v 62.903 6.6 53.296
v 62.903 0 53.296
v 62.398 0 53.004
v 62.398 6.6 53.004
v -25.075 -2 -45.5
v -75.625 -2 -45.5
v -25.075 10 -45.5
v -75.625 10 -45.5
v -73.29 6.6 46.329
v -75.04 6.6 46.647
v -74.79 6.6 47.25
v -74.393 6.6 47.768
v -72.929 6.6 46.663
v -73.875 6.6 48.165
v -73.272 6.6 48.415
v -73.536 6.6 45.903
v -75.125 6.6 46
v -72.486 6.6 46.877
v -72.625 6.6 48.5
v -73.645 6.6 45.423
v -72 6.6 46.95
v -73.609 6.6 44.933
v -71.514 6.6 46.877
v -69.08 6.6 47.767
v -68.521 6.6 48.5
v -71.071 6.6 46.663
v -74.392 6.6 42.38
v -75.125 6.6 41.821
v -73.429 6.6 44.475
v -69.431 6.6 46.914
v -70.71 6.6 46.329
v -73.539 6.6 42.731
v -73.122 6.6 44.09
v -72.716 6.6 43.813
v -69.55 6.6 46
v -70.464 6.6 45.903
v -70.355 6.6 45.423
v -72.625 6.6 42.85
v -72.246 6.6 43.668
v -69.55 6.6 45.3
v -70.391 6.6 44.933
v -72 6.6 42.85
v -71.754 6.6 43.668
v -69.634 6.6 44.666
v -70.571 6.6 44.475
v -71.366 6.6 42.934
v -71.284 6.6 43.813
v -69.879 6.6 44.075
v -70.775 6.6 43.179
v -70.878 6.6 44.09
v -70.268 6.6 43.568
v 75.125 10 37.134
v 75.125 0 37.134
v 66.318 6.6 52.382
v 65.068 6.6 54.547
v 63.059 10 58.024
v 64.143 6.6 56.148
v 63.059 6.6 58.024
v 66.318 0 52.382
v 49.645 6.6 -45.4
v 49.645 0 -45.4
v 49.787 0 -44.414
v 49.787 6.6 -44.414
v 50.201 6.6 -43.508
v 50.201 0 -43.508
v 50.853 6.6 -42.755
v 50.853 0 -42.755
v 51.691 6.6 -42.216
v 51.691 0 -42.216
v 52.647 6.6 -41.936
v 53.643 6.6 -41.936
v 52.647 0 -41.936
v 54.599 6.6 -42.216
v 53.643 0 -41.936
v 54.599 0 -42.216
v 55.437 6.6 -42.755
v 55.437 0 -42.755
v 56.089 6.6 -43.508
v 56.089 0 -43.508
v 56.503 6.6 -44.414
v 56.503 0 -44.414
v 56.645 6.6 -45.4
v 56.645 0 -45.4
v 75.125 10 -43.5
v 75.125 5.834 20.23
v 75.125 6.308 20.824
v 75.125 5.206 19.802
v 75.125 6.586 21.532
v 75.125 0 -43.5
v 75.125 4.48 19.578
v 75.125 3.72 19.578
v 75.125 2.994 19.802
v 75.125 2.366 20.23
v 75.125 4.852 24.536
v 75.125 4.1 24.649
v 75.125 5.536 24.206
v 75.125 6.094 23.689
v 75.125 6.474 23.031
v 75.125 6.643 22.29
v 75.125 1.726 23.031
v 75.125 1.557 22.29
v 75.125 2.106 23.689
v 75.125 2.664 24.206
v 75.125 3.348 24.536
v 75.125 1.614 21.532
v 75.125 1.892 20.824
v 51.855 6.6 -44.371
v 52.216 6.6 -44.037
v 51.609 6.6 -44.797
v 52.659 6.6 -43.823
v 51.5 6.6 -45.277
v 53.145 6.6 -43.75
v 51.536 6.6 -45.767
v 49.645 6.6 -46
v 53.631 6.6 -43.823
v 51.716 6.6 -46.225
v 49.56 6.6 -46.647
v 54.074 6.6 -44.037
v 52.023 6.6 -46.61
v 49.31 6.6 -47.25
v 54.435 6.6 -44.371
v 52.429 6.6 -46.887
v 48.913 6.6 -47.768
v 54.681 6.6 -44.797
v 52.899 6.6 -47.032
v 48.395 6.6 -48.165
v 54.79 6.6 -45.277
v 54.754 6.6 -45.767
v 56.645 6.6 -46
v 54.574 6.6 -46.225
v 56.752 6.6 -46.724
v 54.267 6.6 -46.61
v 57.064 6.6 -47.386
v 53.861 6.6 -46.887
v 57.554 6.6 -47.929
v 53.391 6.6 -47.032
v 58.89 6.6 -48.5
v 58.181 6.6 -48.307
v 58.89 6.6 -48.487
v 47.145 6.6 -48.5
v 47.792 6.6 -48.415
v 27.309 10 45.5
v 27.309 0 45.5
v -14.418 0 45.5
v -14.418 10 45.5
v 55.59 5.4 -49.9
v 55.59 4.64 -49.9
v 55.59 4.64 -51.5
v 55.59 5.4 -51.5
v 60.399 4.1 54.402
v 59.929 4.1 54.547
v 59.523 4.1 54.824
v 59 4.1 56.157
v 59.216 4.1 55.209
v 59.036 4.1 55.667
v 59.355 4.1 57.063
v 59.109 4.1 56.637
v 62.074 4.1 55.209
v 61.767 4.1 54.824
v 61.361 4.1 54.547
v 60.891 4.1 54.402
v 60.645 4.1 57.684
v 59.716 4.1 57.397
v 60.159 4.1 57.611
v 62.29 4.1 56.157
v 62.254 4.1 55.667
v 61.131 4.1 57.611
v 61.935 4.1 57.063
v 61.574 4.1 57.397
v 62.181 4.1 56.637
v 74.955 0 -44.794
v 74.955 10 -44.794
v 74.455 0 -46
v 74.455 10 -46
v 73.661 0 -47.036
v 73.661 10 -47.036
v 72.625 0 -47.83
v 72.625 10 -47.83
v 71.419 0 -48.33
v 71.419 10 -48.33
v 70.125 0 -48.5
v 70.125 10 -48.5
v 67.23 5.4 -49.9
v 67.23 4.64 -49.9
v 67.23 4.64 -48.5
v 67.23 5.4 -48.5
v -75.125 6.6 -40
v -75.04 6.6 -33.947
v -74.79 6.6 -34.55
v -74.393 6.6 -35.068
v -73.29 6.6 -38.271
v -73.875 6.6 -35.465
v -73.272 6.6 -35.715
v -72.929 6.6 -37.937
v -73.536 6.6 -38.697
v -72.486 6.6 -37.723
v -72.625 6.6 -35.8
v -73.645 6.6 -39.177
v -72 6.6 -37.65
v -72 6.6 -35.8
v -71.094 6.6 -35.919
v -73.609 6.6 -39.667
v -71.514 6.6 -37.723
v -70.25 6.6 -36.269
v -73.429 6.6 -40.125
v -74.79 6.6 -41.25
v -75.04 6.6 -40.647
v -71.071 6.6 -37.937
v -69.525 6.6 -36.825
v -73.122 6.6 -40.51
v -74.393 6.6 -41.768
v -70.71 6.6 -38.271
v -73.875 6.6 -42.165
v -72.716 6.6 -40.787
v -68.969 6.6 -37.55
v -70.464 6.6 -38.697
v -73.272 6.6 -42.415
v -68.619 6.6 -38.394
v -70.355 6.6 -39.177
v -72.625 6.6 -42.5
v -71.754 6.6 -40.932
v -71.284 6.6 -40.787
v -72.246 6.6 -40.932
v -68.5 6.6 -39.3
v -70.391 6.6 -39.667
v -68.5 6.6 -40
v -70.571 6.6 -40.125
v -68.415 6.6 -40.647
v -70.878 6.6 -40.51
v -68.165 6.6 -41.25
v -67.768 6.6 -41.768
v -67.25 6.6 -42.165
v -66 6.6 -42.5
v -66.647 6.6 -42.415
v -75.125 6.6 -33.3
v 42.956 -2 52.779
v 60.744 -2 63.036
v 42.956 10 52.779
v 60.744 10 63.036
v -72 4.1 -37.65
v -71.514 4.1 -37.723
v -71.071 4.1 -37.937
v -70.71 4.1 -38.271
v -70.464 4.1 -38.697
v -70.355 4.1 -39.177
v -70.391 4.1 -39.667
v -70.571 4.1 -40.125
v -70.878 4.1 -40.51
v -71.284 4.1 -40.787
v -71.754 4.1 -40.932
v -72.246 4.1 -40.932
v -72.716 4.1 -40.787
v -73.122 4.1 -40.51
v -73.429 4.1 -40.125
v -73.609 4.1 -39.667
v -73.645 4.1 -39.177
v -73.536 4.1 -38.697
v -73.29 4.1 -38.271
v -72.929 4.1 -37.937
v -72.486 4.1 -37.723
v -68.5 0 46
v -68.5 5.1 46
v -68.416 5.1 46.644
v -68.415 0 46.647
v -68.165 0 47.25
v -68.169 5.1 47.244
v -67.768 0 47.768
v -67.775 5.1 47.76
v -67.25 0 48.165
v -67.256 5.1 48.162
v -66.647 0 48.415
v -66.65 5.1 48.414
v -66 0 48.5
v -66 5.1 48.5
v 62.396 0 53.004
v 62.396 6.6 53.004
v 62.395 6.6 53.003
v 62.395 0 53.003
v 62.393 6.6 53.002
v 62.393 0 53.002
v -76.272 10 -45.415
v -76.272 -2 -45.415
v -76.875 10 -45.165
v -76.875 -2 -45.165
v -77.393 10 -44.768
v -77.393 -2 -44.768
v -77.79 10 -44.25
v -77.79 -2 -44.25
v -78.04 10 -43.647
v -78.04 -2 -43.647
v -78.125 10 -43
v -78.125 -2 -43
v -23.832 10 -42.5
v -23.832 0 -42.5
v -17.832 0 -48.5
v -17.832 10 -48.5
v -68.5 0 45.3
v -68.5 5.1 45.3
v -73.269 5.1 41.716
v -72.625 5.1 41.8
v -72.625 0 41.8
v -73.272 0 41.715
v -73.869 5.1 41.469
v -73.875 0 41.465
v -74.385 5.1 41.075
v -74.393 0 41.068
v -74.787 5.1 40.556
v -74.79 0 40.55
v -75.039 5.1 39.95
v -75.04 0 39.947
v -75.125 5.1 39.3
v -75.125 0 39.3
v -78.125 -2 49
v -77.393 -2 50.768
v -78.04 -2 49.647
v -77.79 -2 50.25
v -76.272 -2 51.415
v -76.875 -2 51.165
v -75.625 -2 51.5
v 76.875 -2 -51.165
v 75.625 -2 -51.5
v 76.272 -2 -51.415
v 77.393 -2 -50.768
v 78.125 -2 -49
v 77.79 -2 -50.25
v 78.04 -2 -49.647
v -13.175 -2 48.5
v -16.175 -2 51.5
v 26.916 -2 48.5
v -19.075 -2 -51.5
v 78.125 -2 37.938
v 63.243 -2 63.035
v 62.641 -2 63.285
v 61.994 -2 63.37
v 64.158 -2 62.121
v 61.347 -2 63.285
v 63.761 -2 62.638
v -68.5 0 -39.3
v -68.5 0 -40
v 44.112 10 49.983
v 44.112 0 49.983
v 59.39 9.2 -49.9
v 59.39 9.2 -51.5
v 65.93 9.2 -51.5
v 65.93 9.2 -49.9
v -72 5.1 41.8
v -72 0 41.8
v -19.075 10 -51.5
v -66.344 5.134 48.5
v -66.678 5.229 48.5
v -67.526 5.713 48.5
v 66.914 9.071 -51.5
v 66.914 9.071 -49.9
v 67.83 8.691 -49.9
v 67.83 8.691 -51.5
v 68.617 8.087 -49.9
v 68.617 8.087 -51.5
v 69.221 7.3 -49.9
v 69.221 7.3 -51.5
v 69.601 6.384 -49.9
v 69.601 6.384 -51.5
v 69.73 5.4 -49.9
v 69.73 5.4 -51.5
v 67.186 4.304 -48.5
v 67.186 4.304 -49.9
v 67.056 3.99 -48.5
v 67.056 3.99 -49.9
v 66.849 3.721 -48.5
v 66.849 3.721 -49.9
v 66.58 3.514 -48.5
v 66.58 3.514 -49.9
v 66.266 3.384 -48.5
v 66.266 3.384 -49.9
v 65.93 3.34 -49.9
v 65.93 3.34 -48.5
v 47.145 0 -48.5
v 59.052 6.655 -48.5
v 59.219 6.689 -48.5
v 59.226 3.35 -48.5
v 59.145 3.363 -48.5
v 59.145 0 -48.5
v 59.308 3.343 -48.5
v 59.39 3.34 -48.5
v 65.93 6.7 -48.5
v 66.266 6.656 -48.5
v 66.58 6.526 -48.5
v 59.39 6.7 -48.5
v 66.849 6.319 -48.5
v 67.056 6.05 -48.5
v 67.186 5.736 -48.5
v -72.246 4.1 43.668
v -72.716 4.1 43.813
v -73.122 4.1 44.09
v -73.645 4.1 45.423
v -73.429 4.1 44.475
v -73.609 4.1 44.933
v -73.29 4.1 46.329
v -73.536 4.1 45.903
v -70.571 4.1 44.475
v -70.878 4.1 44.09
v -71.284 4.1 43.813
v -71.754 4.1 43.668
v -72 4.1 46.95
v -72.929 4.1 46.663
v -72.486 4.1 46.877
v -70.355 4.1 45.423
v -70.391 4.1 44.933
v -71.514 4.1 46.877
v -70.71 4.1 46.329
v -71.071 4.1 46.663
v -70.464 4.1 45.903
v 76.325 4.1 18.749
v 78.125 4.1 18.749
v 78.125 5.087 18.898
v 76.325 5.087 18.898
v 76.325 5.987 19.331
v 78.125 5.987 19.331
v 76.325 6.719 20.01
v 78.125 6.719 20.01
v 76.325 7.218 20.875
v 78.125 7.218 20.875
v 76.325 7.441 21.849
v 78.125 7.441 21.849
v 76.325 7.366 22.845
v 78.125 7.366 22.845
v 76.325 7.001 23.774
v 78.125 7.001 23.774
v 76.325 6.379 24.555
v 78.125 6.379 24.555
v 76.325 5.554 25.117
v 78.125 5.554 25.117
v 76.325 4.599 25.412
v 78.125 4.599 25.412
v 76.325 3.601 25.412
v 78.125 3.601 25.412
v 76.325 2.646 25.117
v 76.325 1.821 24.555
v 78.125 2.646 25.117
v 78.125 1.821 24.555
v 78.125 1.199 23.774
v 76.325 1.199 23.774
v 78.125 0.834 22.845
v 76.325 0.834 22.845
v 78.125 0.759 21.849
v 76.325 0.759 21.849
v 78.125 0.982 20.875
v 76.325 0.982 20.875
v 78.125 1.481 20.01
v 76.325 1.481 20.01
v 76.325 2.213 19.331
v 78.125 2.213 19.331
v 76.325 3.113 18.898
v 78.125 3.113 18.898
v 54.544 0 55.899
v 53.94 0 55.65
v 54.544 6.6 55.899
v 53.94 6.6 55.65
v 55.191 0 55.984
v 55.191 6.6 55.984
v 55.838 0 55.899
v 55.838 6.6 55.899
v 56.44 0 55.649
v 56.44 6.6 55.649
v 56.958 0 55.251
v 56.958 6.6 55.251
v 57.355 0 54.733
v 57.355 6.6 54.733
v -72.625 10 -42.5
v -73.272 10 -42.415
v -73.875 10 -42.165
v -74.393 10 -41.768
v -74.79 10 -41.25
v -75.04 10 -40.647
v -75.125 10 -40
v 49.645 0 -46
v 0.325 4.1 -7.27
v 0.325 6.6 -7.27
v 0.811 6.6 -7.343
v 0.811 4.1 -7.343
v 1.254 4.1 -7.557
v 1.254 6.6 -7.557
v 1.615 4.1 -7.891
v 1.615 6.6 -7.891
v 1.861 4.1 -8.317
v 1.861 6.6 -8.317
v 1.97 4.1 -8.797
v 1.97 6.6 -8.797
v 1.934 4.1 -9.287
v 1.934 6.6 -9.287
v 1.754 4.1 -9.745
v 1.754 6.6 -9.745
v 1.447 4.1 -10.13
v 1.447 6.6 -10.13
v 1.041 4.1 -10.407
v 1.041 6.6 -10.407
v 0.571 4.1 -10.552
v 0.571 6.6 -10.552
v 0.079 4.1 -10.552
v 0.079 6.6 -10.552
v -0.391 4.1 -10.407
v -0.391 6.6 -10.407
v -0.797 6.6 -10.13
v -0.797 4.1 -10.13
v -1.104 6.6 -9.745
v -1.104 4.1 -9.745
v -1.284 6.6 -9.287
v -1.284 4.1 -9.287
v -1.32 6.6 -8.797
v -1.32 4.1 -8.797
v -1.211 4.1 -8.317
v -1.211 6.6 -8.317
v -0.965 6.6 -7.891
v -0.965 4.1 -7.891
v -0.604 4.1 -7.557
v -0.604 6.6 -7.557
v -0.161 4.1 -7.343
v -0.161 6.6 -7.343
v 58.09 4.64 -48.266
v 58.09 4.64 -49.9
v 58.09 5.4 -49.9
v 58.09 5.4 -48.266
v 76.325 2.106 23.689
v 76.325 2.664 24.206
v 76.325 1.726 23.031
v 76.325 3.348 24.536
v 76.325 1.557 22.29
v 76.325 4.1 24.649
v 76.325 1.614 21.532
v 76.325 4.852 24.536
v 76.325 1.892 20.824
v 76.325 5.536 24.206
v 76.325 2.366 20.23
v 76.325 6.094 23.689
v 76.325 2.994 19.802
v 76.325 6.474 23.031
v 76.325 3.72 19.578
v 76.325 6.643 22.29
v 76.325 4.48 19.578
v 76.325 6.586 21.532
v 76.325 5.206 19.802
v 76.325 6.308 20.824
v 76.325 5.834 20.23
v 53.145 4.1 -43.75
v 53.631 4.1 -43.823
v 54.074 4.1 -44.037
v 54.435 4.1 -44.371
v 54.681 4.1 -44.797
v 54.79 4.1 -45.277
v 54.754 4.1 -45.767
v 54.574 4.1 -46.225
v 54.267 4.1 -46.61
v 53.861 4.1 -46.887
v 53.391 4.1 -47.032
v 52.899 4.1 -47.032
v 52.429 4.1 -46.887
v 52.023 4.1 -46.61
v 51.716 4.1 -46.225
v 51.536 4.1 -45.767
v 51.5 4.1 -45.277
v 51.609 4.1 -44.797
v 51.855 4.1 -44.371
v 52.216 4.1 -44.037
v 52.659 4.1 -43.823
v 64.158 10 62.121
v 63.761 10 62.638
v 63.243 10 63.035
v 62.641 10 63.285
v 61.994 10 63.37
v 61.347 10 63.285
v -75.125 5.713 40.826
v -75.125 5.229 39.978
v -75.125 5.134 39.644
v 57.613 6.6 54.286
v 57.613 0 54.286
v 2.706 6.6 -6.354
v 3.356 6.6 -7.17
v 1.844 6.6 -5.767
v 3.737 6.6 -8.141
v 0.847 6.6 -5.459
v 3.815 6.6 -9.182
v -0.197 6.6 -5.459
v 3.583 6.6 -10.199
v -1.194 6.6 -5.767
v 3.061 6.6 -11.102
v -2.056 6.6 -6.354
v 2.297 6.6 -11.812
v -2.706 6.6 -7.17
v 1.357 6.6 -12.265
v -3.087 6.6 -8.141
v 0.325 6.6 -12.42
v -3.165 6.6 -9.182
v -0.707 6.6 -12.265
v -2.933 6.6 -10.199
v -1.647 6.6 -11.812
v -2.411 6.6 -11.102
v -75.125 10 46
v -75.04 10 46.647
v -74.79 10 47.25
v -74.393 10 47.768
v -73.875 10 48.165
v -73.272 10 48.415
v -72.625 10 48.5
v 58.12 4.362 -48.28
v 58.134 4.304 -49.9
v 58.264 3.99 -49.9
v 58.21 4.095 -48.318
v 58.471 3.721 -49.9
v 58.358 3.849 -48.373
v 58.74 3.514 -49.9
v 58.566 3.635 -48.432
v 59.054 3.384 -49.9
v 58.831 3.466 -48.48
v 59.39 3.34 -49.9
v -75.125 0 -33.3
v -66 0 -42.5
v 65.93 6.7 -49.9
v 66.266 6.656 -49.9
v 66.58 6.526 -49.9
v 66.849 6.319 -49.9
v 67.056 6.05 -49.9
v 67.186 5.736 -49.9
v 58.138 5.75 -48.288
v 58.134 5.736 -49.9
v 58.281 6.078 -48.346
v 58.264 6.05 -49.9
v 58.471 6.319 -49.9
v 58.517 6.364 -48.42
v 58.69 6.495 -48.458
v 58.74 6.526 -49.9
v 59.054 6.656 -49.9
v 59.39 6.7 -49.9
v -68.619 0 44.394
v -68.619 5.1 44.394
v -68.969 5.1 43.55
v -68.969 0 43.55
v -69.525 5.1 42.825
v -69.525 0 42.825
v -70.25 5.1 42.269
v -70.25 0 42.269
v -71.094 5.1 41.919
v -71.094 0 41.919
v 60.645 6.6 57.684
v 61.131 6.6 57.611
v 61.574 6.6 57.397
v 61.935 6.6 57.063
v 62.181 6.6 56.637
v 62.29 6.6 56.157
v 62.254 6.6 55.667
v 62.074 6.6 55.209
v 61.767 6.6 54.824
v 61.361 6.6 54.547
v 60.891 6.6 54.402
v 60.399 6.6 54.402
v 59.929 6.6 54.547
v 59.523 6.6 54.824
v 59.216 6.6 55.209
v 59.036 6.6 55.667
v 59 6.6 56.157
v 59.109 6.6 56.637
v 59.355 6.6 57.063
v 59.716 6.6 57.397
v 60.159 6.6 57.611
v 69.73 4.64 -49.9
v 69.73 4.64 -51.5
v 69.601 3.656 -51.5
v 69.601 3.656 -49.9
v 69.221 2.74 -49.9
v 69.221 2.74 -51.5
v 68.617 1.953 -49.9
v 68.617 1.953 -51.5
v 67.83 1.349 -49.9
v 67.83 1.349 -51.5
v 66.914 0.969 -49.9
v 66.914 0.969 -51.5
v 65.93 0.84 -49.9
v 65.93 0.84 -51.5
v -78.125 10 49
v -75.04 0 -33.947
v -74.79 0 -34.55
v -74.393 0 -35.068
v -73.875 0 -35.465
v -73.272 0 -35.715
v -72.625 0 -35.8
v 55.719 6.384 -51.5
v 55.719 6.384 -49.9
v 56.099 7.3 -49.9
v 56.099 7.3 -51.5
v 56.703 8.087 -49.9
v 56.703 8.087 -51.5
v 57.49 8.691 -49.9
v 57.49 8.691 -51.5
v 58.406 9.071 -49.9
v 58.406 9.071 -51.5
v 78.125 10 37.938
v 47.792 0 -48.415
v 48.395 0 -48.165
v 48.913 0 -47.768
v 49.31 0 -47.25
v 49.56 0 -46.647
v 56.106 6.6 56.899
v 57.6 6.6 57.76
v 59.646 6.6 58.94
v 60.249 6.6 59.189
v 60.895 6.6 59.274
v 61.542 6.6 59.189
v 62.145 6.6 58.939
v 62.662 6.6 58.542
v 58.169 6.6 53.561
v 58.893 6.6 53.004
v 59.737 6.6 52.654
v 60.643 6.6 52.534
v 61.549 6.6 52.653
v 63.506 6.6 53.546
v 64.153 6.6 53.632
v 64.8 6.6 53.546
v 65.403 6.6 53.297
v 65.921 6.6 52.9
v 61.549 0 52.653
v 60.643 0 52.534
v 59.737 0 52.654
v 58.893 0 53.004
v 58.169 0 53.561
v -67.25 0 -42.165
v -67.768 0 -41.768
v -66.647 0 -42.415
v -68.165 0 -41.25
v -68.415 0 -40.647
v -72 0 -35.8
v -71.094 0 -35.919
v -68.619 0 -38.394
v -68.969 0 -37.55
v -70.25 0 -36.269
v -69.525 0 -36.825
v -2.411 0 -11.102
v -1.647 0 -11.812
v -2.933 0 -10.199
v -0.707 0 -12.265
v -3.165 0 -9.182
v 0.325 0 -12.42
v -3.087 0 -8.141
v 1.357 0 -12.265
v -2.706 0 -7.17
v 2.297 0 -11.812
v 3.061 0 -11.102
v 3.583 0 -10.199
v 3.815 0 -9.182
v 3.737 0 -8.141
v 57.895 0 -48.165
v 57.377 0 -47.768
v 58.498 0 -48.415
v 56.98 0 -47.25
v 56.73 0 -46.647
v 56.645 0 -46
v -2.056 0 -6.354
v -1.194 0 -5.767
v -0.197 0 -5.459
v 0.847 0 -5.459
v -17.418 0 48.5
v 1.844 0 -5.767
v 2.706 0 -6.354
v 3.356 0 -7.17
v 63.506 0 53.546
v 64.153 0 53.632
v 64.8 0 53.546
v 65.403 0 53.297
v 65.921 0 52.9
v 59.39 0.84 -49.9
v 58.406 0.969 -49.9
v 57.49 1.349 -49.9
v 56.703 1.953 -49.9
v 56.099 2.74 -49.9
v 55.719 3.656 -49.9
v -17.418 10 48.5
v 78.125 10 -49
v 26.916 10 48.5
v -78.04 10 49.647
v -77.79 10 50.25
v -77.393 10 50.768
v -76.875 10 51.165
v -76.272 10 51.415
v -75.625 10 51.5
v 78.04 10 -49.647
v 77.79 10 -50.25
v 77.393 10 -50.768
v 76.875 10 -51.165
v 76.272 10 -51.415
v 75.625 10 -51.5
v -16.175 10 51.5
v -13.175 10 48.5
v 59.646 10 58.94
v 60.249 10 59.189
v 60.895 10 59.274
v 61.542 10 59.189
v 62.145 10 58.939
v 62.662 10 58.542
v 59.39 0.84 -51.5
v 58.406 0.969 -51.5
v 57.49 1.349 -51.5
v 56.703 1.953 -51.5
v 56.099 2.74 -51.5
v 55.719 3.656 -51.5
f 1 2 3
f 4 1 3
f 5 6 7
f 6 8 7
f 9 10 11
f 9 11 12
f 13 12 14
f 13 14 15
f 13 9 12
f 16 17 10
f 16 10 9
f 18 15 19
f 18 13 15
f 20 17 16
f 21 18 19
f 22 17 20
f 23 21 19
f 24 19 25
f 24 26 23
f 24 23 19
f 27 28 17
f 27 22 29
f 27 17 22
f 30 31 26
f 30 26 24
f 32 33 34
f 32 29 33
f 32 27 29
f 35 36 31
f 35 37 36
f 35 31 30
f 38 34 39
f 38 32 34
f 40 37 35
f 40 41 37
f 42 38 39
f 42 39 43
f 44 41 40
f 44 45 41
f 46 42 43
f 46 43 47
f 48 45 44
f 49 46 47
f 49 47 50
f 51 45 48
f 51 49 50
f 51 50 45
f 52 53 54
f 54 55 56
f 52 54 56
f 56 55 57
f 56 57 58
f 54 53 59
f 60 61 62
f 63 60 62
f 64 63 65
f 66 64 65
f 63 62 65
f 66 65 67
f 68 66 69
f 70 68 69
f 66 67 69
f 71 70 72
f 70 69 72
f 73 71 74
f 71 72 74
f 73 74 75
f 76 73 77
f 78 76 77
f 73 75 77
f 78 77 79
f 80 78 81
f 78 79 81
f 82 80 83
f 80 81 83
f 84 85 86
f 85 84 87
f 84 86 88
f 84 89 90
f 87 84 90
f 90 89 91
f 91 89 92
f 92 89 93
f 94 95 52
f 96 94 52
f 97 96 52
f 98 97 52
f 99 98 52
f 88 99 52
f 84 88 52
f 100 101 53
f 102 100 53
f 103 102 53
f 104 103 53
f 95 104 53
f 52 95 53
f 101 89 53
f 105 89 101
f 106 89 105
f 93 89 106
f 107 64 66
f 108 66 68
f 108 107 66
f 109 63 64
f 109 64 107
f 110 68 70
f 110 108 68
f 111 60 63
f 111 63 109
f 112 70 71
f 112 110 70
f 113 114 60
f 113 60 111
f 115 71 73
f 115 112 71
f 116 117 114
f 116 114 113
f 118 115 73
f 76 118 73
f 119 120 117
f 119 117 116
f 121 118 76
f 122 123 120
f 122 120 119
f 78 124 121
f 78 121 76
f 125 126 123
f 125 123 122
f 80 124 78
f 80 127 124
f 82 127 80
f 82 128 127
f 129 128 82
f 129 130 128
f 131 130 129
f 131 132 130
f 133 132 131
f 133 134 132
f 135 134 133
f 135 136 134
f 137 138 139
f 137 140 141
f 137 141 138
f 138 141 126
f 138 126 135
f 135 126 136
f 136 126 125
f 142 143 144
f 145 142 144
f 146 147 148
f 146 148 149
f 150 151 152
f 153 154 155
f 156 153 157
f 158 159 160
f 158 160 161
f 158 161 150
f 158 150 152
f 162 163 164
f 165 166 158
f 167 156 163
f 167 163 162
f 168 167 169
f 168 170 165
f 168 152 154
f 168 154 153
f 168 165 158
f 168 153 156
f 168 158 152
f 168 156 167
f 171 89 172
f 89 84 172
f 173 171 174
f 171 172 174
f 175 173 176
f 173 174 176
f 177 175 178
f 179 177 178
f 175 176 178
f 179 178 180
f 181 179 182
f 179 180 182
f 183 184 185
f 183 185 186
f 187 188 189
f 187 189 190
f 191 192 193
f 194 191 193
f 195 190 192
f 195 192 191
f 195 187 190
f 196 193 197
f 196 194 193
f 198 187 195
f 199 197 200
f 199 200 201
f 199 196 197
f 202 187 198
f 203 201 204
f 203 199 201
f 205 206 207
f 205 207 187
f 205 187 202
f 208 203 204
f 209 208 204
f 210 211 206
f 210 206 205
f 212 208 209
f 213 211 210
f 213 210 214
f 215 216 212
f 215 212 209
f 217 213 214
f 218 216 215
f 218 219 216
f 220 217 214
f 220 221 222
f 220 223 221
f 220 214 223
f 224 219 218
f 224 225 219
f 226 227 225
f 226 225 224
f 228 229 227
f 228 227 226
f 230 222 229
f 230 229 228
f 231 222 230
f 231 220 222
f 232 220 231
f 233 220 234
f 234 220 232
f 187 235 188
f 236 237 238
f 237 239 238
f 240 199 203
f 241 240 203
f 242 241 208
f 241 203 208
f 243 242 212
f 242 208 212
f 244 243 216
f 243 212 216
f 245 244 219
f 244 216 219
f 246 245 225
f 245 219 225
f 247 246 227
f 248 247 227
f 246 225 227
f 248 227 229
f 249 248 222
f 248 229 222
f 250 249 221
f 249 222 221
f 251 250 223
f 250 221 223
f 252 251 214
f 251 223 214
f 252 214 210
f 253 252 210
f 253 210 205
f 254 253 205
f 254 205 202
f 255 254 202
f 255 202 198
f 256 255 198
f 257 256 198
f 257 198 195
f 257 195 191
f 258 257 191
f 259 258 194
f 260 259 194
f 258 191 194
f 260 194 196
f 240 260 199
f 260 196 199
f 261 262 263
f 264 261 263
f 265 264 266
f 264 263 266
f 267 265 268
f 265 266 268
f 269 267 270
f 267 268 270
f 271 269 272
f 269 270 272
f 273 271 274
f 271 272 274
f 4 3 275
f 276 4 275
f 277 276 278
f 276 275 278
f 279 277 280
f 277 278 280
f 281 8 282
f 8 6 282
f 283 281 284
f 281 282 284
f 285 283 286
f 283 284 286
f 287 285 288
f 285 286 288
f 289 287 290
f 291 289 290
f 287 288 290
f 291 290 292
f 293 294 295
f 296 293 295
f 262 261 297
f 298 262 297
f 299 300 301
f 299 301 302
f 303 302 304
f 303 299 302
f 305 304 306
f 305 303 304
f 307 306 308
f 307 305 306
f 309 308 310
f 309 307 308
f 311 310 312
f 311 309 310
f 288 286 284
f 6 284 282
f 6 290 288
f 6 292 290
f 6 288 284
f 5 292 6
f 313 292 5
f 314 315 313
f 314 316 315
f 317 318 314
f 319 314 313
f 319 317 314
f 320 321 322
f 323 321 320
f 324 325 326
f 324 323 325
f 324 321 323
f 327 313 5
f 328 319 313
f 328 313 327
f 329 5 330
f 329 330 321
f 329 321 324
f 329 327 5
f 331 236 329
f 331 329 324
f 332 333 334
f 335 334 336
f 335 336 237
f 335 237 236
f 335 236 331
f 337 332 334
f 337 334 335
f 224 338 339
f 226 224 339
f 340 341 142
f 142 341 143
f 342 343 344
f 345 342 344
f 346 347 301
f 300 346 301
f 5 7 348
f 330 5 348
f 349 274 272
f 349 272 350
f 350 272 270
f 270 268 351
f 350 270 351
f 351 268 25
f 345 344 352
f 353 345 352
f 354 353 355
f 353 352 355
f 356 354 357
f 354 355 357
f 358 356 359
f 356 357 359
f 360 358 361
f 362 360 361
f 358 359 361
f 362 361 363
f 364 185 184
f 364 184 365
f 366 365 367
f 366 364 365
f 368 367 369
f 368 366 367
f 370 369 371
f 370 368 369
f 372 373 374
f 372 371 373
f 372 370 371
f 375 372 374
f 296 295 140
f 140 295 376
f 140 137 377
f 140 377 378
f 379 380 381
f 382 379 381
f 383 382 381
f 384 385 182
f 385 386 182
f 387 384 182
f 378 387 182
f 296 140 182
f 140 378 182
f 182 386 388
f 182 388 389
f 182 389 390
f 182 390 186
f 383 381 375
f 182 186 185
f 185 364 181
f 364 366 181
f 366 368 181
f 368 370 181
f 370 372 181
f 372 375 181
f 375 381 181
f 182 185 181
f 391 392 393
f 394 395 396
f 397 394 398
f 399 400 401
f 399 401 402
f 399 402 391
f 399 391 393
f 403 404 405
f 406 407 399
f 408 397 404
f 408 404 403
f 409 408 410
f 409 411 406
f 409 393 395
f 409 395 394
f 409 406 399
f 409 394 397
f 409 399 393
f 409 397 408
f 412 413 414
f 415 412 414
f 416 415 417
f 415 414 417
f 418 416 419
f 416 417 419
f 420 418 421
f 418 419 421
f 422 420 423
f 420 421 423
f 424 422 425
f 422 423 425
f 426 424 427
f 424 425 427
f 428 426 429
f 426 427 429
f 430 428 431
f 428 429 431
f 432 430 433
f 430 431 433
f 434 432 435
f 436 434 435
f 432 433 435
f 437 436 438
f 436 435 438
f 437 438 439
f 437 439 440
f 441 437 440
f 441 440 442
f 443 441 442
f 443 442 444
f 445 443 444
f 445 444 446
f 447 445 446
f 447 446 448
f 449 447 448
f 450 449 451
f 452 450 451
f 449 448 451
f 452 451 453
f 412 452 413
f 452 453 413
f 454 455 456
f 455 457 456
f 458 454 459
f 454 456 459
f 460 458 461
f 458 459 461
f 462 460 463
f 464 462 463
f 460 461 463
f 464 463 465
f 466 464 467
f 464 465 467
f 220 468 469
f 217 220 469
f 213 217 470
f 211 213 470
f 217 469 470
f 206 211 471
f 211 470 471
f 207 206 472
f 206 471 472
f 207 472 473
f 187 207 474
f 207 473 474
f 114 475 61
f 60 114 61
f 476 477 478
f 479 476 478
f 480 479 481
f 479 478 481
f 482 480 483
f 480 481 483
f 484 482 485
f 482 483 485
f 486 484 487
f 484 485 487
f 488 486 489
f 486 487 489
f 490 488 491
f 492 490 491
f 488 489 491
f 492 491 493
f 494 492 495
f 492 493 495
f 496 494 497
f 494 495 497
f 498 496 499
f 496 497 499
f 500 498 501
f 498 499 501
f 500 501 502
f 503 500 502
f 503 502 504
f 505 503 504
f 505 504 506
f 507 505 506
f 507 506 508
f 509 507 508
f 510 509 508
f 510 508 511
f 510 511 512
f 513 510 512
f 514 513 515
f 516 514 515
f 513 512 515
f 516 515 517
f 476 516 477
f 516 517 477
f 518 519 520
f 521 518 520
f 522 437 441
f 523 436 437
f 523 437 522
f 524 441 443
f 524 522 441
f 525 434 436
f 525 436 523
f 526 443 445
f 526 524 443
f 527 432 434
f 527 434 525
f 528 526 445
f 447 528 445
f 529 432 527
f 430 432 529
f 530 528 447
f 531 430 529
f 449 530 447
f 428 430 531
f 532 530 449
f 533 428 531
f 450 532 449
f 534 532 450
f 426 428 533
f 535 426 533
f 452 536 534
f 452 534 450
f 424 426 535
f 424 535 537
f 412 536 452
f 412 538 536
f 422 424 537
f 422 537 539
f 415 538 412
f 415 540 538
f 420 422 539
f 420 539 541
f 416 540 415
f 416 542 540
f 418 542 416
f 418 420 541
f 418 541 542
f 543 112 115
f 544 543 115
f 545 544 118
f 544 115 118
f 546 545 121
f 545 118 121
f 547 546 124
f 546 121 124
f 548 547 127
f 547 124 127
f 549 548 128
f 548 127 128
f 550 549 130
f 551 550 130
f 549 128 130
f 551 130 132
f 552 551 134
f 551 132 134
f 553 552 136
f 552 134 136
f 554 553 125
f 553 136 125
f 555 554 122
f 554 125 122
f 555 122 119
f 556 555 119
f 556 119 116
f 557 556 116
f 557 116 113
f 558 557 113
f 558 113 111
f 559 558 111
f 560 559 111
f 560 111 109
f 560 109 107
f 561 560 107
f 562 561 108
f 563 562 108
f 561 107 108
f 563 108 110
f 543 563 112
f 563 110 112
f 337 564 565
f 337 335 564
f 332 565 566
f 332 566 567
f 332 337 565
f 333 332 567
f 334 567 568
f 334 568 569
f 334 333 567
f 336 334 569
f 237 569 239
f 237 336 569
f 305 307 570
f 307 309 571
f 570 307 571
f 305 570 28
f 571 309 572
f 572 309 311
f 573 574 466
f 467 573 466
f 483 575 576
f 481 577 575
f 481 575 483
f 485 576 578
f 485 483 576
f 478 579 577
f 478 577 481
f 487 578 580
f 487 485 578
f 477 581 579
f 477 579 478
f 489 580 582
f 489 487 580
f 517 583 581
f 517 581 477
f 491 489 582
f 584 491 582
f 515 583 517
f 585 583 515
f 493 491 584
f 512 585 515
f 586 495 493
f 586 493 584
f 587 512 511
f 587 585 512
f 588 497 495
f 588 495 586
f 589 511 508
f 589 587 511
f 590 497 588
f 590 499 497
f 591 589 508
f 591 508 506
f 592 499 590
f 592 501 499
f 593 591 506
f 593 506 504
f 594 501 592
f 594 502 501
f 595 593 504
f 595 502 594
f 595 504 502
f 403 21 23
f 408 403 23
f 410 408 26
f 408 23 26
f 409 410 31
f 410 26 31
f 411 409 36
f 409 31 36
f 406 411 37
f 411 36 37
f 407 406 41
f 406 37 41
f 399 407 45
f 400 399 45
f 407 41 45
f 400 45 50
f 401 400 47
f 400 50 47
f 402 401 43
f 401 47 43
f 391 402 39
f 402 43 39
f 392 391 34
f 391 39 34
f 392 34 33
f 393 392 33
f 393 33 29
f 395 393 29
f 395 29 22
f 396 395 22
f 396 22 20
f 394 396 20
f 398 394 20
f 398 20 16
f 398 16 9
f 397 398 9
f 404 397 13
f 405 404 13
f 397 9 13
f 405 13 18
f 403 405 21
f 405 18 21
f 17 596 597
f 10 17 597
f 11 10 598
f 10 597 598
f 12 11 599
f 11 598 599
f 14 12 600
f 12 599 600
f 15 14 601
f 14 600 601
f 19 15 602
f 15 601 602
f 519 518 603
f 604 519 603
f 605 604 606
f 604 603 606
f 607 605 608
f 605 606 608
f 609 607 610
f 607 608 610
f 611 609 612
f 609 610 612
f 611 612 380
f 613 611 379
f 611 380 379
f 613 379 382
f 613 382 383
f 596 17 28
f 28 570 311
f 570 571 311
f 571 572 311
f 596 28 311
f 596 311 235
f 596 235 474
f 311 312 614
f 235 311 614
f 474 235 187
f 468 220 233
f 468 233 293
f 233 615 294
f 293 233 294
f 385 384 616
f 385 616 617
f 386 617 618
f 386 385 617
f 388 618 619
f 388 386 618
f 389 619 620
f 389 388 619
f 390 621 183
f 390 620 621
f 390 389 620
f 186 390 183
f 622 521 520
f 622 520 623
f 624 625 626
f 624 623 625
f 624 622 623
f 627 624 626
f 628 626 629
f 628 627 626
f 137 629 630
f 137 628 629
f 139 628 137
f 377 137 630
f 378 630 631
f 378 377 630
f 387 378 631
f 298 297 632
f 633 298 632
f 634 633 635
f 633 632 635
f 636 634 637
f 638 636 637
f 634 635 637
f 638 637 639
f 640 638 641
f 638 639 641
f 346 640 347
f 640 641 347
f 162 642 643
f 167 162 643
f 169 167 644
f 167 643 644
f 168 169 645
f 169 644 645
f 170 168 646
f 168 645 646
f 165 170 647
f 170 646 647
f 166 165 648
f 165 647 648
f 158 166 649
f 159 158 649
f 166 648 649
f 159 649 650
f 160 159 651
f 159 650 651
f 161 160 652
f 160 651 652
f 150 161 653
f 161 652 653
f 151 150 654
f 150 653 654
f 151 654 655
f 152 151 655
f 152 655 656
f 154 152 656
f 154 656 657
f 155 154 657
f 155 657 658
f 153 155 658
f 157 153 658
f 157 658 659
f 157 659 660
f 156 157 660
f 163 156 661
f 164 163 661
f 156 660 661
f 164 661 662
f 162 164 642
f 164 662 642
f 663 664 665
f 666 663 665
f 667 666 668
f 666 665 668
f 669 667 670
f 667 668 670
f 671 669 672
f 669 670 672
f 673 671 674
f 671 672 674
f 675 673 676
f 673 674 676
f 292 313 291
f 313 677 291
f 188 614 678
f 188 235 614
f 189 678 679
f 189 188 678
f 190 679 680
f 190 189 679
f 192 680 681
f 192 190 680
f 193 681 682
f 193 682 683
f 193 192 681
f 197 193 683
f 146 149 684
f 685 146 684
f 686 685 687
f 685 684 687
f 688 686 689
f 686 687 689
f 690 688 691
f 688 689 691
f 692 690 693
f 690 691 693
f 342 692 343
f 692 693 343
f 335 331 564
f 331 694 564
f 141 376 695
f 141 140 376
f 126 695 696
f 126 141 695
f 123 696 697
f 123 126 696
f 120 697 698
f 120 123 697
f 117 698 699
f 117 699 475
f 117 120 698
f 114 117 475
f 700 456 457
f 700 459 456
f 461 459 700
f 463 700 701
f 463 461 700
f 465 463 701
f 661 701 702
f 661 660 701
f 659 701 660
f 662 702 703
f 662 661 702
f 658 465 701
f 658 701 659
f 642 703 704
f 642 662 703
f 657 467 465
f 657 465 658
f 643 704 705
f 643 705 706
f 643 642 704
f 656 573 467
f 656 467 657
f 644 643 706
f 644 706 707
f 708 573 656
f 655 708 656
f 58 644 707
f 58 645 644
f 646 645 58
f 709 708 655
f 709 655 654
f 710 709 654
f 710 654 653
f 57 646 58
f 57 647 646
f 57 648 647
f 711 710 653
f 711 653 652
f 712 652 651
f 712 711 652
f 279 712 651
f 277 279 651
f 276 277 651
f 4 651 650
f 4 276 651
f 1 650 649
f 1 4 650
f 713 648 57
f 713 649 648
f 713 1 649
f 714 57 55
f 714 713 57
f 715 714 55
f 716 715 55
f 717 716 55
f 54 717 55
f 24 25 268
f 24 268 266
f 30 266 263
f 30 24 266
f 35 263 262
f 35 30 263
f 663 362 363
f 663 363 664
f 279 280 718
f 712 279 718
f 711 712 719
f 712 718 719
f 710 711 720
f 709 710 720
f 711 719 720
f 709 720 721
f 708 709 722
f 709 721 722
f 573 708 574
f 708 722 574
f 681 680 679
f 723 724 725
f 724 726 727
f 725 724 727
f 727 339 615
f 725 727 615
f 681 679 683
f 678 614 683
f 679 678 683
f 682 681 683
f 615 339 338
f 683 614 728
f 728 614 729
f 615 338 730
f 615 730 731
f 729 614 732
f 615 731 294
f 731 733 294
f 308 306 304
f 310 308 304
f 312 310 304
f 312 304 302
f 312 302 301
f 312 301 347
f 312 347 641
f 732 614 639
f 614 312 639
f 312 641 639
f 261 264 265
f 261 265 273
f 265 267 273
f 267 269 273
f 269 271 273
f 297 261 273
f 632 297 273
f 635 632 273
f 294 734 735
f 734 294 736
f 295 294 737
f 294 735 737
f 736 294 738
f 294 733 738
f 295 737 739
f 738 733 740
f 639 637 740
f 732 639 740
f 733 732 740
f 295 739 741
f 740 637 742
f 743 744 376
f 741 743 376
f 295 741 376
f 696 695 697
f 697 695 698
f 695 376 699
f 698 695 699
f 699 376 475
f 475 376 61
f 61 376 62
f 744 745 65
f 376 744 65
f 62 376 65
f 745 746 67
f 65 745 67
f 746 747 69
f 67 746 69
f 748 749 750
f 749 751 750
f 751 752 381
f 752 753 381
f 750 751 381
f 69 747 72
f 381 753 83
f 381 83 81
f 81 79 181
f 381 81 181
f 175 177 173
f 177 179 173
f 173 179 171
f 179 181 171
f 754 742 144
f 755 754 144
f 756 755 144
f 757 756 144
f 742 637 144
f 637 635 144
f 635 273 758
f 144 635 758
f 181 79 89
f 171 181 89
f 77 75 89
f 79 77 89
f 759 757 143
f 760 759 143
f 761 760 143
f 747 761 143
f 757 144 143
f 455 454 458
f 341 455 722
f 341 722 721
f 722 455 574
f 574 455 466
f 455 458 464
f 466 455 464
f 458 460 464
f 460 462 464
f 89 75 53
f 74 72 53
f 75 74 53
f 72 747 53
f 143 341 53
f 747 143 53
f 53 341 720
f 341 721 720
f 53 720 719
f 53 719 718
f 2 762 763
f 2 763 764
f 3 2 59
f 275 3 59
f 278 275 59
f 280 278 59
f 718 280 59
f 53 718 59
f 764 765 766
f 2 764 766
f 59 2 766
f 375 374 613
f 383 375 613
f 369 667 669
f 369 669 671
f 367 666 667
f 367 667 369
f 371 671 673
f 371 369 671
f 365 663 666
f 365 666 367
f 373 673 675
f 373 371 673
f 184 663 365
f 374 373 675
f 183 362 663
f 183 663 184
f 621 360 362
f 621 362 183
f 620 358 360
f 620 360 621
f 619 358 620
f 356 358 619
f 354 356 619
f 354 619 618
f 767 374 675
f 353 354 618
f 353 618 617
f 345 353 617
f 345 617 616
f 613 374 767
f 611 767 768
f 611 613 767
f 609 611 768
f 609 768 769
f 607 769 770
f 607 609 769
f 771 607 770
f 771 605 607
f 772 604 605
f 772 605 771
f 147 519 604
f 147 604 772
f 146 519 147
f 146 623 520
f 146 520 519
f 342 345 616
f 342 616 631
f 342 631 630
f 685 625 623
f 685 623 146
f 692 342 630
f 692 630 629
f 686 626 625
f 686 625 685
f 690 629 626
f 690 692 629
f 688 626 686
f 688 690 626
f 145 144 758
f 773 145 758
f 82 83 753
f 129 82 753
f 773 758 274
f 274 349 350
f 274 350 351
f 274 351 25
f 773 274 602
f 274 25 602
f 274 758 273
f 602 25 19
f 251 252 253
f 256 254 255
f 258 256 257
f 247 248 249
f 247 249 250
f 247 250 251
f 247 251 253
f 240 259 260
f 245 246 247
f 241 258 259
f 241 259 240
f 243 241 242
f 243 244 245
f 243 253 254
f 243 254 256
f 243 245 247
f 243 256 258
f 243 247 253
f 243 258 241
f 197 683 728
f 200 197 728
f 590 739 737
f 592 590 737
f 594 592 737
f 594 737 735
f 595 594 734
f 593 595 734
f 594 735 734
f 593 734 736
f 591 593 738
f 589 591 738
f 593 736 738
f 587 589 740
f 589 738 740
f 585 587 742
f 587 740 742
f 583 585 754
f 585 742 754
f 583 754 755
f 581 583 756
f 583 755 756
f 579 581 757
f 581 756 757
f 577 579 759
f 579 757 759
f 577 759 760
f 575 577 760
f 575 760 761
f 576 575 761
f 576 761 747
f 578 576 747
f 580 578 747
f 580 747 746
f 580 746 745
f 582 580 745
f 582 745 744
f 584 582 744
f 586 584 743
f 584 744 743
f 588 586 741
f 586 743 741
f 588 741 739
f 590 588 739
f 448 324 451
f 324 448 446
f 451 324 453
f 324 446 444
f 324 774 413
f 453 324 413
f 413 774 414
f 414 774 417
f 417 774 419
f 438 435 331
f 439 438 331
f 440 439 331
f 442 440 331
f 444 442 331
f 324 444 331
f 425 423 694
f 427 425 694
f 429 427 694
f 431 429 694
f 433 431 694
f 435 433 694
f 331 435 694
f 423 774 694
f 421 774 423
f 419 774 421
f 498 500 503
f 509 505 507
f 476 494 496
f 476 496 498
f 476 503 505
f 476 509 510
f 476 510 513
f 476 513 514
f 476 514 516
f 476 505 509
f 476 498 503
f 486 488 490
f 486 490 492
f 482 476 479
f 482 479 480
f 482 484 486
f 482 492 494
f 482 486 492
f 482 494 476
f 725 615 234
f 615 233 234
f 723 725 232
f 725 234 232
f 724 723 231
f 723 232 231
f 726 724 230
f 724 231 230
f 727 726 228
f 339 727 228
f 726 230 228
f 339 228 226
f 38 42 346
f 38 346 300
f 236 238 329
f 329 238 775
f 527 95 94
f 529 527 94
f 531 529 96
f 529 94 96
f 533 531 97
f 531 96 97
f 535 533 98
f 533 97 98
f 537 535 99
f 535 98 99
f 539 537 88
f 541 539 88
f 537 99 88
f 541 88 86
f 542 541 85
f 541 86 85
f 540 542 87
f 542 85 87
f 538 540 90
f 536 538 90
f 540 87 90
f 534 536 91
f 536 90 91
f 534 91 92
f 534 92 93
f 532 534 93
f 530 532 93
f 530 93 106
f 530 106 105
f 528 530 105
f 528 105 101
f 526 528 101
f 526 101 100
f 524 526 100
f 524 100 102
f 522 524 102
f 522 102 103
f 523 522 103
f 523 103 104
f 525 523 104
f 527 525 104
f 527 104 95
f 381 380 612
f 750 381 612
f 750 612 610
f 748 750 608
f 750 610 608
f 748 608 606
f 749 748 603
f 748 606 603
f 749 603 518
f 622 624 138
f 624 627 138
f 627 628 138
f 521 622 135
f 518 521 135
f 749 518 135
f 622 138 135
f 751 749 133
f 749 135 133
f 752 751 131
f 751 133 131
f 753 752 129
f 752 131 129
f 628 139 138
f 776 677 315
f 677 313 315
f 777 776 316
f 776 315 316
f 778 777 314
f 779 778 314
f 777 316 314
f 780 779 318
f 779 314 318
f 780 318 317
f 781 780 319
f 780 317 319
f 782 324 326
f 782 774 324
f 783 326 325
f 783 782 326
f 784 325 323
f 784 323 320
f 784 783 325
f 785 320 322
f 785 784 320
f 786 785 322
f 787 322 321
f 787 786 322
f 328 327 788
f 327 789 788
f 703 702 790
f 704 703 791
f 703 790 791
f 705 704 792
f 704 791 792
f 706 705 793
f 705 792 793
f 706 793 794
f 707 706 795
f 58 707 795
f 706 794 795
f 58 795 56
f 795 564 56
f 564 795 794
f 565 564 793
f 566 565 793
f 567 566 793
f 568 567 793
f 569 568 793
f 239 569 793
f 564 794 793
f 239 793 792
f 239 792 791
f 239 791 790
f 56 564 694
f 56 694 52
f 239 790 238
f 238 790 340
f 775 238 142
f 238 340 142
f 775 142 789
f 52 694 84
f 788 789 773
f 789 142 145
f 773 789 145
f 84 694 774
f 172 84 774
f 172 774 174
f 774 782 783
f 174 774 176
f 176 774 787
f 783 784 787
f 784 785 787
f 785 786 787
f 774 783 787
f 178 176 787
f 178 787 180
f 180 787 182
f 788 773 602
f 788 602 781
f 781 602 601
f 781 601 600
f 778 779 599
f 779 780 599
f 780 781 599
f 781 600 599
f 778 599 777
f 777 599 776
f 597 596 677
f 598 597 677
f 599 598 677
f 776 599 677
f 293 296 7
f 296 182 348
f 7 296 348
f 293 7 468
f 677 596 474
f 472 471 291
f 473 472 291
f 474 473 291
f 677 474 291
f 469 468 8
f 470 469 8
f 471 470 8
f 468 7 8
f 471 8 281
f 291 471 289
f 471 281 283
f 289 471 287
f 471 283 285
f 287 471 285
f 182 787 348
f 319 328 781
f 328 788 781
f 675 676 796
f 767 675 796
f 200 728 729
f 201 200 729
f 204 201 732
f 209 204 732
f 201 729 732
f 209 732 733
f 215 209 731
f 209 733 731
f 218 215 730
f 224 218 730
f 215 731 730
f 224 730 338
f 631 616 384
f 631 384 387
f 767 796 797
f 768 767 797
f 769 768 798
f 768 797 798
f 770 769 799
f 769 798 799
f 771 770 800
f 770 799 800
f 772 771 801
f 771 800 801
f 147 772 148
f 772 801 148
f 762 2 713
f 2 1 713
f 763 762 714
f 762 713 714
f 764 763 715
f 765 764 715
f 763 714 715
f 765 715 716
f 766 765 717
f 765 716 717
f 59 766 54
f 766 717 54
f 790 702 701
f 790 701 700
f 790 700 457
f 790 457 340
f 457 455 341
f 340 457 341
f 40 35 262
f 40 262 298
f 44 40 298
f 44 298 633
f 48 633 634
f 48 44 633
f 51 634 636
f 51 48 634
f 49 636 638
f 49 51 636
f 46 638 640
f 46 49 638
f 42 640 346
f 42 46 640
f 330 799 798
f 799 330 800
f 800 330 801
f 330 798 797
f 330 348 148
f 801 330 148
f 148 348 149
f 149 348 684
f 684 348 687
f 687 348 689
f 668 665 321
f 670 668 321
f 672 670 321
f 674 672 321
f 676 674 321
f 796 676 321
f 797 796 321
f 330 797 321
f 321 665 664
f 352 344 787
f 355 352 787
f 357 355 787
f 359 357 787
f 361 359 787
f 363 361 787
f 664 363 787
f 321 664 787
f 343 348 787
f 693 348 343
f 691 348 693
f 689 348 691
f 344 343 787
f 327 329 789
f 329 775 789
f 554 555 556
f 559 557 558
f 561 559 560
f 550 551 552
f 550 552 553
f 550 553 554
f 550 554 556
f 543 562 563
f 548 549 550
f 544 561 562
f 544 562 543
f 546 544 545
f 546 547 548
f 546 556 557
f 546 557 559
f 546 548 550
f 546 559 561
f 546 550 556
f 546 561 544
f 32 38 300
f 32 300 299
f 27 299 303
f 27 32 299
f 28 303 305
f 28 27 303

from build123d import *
from OCP.BRepFilletAPI import BRepFilletAPI_MakeChamfer

# Parameters (mm, degrees)
BOSS_EXTRUDE1_DEPTH = 10
BOSS_EXTRUDE2_DEPTH = 2
FILLET1_R           = 2.5
FILLET2_R           = 2.5
FILLET4_R           = 5
SKETCH3_R           = 3.5
BOSS_EXTRUDE3_DEPTH = 6.6
SKETCH5_R           = 1.65
CUT_EXTRUDE1_DEPTH  = 2.5
FILLET3_R           = 2.5
SKETCH6_R           = 2.55
CUT_EXTRUDE2_DEPTH  = 167.136549573
SKETCH7_R           = 3.35
CUT_EXTRUDE3_DEPTH  = 1.8
CUT_EXTRUDE4_REACH  = 141.279
SKETCH8_W           = 9.14
SKETCH8_H           = 3.36
FILLET5_R           = 1.3
CUT_EXTRUDE5_DEPTH  = 1.6
CHAMFER1_SIZE       = 1.5
CHAMFER1_SIZE2      = 1.050311307


with BuildPart() as part:
    # Sketch1 → Boss-Extrude1 (new body)
    with BuildSketch(Plane(origin=(0, 0, 0), x_dir=(1, 0, 0), z_dir=(0, 1, 0))):
        Polygon((78.125, -37.9381301), (62.908489388, -64.283910205), (42.956179643, -52.779359478), (26.916138362, -48.5), (-13.175252532, -48.5), (-16.175252532, -51.5), (-78.125, -51.5), (-78.125, 45.5), (-25.074747468, 45.5), (-19.074747468, 51.5), (78.125, 51.5), align=None)
        Polygon((75.125, -37.134018586), (61.80999823, -60.187537075), (44.11188212, -49.982759925), (27.309448337, -45.5), (-14.417893219, -45.5), (-17.417893219, -48.5), (-75.125, -48.5), (-75.125, 42.5), (-23.832106781, 42.5), (-17.832106781, 48.5), (75.125, 48.5), align=None, mode=Mode.SUBTRACT)
    extrude(amount=BOSS_EXTRUDE1_DEPTH)

    # Sketch2 → Boss-Extrude2 (add)
    with BuildSketch(Plane.XZ):
        Polygon((78.125, -51.5), (78.125, 37.9381301), (62.908489388, 64.283910205), (42.956179643, 52.779359478), (26.916138362, 48.5), (-13.175252532, 48.5), (-16.175252532, 51.5), (-78.125, 51.5), (-78.125, -45.5), (-25.074747468, -45.5), (-19.074747468, -51.5), align=None)
    extrude(amount=BOSS_EXTRUDE2_DEPTH)

    # Fillet1
    fillet1_edges = [part.edges().sort_by_distance(p)[0] for p in [
        (-75.125, 5, -42.5),
        (-75.125, 5, 48.5),
        (61.80999823, 5, 60.187537075),
    ]]
    fillet(fillet1_edges, radius=FILLET1_R)

    # Fillet2
    fillet2_edges = [part.edges().sort_by_distance(p)[0] for p in [
        (62.908489388, 4, 64.283910205),
        (-78.125, 4, 51.5),
        (-78.125, 4, -45.5),
        (78.125, 4, -51.5),
    ]]
    fillet(fillet2_edges, radius=FILLET2_R)

    # Fillet4
    fillet4_edges = [part.edges().sort_by_distance(p)[0] for p in [
        (75.125, 5, -48.5),
    ]]
    fillet(fillet4_edges, radius=FILLET4_R)

    # Sketch3 → Boss-Extrude3 (add)
    with BuildSketch(Plane(origin=(0, 0, 0), x_dir=(1, 0, 0), z_dir=(0, 1, 0))):
        with BuildLine():
            ThreePointArc((-68.5, -45.3), (-69.525126266, -42.825126266), (-72, -41.8))
            ThreePointArc((-72, -41.8), (-73.834848074, -42.319508003), (-75.125, -43.723809973))
            Line((-75.125, -43.723809973), (-75.125, -46))
            ThreePointArc((-75.125, -46), (-74.392766953, -47.767766953), (-72.625, -48.5))
            Line((-72.625, -48.5), (-70.582255312, -48.5))
            ThreePointArc((-70.582255312, -48.5), (-69.066392459, -47.208912464), (-68.5, -45.3))
        make_face()
        with BuildLine():
            Line((-75.125, -46), (-75.125, -43.723809973))
            ThreePointArc((-75.125, -43.723809973), (-74.536075308, -47.712119821), (-70.582255312, -48.5))
            Line((-70.582255312, -48.5), (-72.625, -48.5))
            ThreePointArc((-72.625, -48.5), (-74.392766953, -47.767766953), (-75.125, -46))
        make_face()
        with BuildLine():
            Line((-72, -41.8), (-75.125, -41.8))
            Line((-75.125, -41.8), (-75.125, -43.723809973))
            ThreePointArc((-75.125, -43.723809973), (-73.834848074, -42.319508003), (-72, -41.8))
        make_face()
        with BuildLine():
            ThreePointArc((-70.582255312, 42.5), (-69.066392459, 41.208912464), (-68.5, 39.3))
            Line((-68.5, 39.3), (-68.5, 42.5))
            Line((-68.5, 42.5), (-70.582255312, 42.5))
        make_face()
        with BuildLine():
            ThreePointArc((-72, 35.8), (-69.525126266, 36.825126266), (-68.5, 39.3))
            ThreePointArc((-68.5, 39.3), (-69.066392459, 41.208912464), (-70.582255312, 42.5))
            Line((-70.582255312, 42.5), (-72.625, 42.5))
            ThreePointArc((-72.625, 42.5), (-74.392766953, 41.767766953), (-75.125, 40))
            Line((-75.125, 40), (-75.125, 37.723809973))
            ThreePointArc((-75.125, 37.723809973), (-73.834848074, 36.319508003), (-72, 35.8))
        make_face()
        with BuildLine():
            Line((-72.625, 42.5), (-70.582255312, 42.5))
            ThreePointArc((-70.582255312, 42.5), (-74.536075308, 41.712119821), (-75.125, 37.723809973))
            Line((-75.125, 37.723809973), (-75.125, 40))
            ThreePointArc((-75.125, 40), (-74.392766953, 41.767766953), (-72.625, 42.5))
        make_face()
        with BuildLine():
            Line((-75.125, 35.8), (-72, 35.8))
            ThreePointArc((-72, 35.8), (-73.834848074, 36.319508003), (-75.125, 37.723809973))
            Line((-75.125, 37.723809973), (-75.125, 35.8))
        make_face()
        with Locations(Location((0.325, 8.92, 0), (0, 0, 90))):
            Circle(SKETCH3_R)
        with BuildLine():
            ThreePointArc((54.769807681, 48.5), (53.145, 48.9), (51.520192319, 48.5))
            Line((51.520192319, 48.5), (54.769807681, 48.5))
        make_face()
        with BuildLine():
            Line((54.769807681, 48.5), (51.520192319, 48.5))
            ThreePointArc((51.520192319, 48.5), (50.150269054, 47.21151499), (49.645, 45.4))
            ThreePointArc((49.645, 45.4), (53.145, 41.9), (56.645, 45.4))
            ThreePointArc((56.645, 45.4), (56.139730946, 47.21151499), (54.769807681, 48.5))
        make_face()
        with BuildLine():
            Line((56.645, 48.5), (54.769807681, 48.5))
            ThreePointArc((54.769807681, 48.5), (56.139730946, 47.21151499), (56.645, 45.4))
            Line((56.645, 45.4), (56.645, 48.5))
        make_face()
        with BuildLine():
            Line((51.520192319, 48.5), (49.645, 48.5))
            Line((49.645, 48.5), (49.645, 45.4))
            ThreePointArc((49.645, 45.4), (50.150269054, 47.21151499), (51.520192319, 48.5))
        make_face()
        with BuildLine():
            Line((65.06794725, -54.546742633), (62.39329915, -53.001948322))
            ThreePointArc((62.39329915, -53.001948322), (63.67559788, -54.283168367), (64.145, -56.034018586))
            ThreePointArc((64.145, -56.034018586), (64.144536351, -56.090986384), (64.143145526, -56.14793909))
            Line((64.143145526, -56.14793909), (65.06794725, -54.546742633))
        make_face()
        with BuildLine():
            ThreePointArc((64.145, -56.034018586), (63.67559788, -54.283168367), (62.39329915, -53.001948322))
            ThreePointArc((62.39329915, -53.001948322), (59.73723674, -52.653786957), (57.612929736, -54.285719436))
            ThreePointArc((57.612929736, -54.285719436), (57.145023166, -56.02128423), (57.600288117, -57.760207901))
            Line((57.600288117, -57.760207901), (59.645803824, -58.939657274))
            ThreePointArc((59.645803824, -58.939657274), (61.542115723, -59.188578919), (63.059447202, -58.024248216))
            Line((63.059447202, -58.024248216), (64.143145526, -56.14793909))
            ThreePointArc((64.143145526, -56.14793909), (64.144536351, -56.090986384), (64.145, -56.034018586))
        make_face()
        with BuildLine():
            ThreePointArc((57.600288117, -57.760207901), (61.48240862, -59.432363301), (64.143145526, -56.14793909))
            Line((64.143145526, -56.14793909), (63.059447202, -58.024248216))
            ThreePointArc((63.059447202, -58.024248216), (61.542115723, -59.188578919), (59.645803824, -58.939657274))
            Line((59.645803824, -58.939657274), (57.600288117, -57.760207901))
        make_face()
        with BuildLine():
            Line((57.612929736, -54.285719436), (56.106253452, -56.898743849))
            Line((56.106253452, -56.898743849), (57.600288117, -57.760207901))
            ThreePointArc((57.600288117, -57.760207901), (57.145023166, -56.02128423), (57.612929736, -54.285719436))
        make_face()
        with BuildLine():
            Line((-68.5, -48.5), (-68.5, -45.3))
            ThreePointArc((-68.5, -45.3), (-69.066392459, -47.208912464), (-70.582255312, -48.5))
            Line((-70.582255312, -48.5), (-68.5, -48.5))
        make_face()
    extrude(amount=BOSS_EXTRUDE3_DEPTH)

    # Sketch5 → Cut-Extrude1 (cut)
    with BuildSketch(Plane(origin=(0, 6.6, 0), x_dir=(1, 0, 0), z_dir=(0, 1, 0))):
        with Locations(Location((-72, 39.3, 0), (0, 0, 270))):
            Circle(SKETCH5_R)
        with Locations(Location((0.325, 8.92, 0), (0, 0, 270))):
            Circle(SKETCH5_R)
        with Locations(Location((53.145, 45.4, 0), (0, 0, 270))):
            Circle(SKETCH5_R)
        with Locations(Location((60.645, -56.034018586, 0), (0, 0, 270))):
            Circle(SKETCH5_R)
        with Locations(Location((-72, -45.3, 0), (0, 0, 270))):
            Circle(SKETCH5_R)
    extrude(amount=-CUT_EXTRUDE1_DEPTH, mode=Mode.SUBTRACT)

    # Fillet3
    fillet3_edges = [part.edges().sort_by_distance(p)[0] for p in [
        (-68.5, 3.3, -42.5),
        (-75.125, 3.3, -35.8),
        (56.645, 3.3, -48.5),
        (49.645, 3.3, -48.5),
        (65.06794725, 3.3, 54.546742633),
        (56.106253452, 3.3, 56.898743849),
        (-68.5, 3.3, 48.5),
        (-75.125, 3.3, 41.8),
    ]]
    fillet(fillet3_edges, radius=FILLET3_R)

    # Sketch6 → Cut-Extrude2 (cut, through all)
    with BuildSketch(Plane.ZY.offset(-75.125)):
        with Locations((22.099069046, 4.1)):
            Circle(SKETCH6_R)
    extrude(amount=-CUT_EXTRUDE2_DEPTH, mode=Mode.SUBTRACT)

    # Sketch7 → Cut-Extrude3 (cut)
    with BuildSketch(Plane(origin=(78.125, 0, 0), x_dir=(0, 0, -1), z_dir=(1, 0, 0))):
        with Locations((-22.099069046, 4.1)):
            Circle(SKETCH7_R)
    extrude(amount=-CUT_EXTRUDE3_DEPTH, mode=Mode.SUBTRACT)

    # Sketch8 → Cut-Extrude4 (cut, up to next)
    with BuildSketch(Plane(origin=(0, 0, -51.5), x_dir=(-1, 0, 0), z_dir=(0, 0, -1)), mode=Mode.PRIVATE) as cut_extrude4_sk1:
        with Locations((-62.66, 5.02)):
            Rectangle(SKETCH8_W, SKETCH8_H)
    cut_extrude4_tool1 = extrude(cut_extrude4_sk1.sketch, amount=-CUT_EXTRUDE4_REACH, mode=Mode.PRIVATE) & part.part
    add(cut_extrude4_tool1.solids().sort_by_distance((62.66, 5.02, -51.5))[0], mode=Mode.SUBTRACT)

    # Fillet5
    fillet5_edges = [part.edges().sort_by_distance(p)[0] for p in [
        (67.23, 3.34, -50),
        (58.09, 3.34, -49.883244788),
        (58.09, 6.7, -50),
        (67.23, 6.7, -50),
    ]]
    fillet(fillet5_edges, radius=FILLET5_R)

    # Sketch9 → Cut-Extrude5 (cut)
    with BuildSketch(Plane(origin=(0, 0, -51.5), x_dir=(-1, 0, 0), z_dir=(0, 0, -1))):
        with BuildLine():
            Line((-69.73, 5.4), (-69.73, 4.64))
            ThreePointArc((-69.73, 4.64), (-68.617005769, 1.952994231), (-65.93, 0.84))
            Line((-65.93, 0.84), (-59.39, 0.84))
            ThreePointArc((-59.39, 0.84), (-56.702994231, 1.952994231), (-55.59, 4.64))
            Line((-55.59, 4.64), (-55.59, 5.4))
            ThreePointArc((-55.59, 5.4), (-56.702994231, 8.087005769), (-59.39, 9.2))
            Line((-59.39, 9.2), (-65.93, 9.2))
            ThreePointArc((-65.93, 9.2), (-68.617005769, 8.087005769), (-69.73, 5.4))
        make_face()
    extrude(amount=-CUT_EXTRUDE5_DEPTH, mode=Mode.SUBTRACT)

    # Chamfer1: one chamfer whose edges measure the first distance from different faces: ONE call of the kernel's chamfer builder (chamfer() names one face for all edges)
    chamfer1_edges_1 = [part.edges().sort_by_distance(p)[0] for p in [
        (-68.5, 6.6, 45.65),
    ]]
    chamfer1_side_1 = [part.faces().sort_by_distance(p)[0] for p in [
        (-68.5, 3.3, 45.65),
    ]]
    chamfer1_edges_2 = [part.edges().sort_by_distance(p)[0] for p in [
        (-69.525126266, 6.6, 42.825126266),
    ]]
    chamfer1_side_2 = [part.faces().sort_by_distance(p)[0] for p in [
        (-69.525126266, 3.3, 42.825126266),
    ]]
    chamfer1_edges_3 = [part.edges().sort_by_distance(p)[0] for p in [
        (-72.3125, 6.6, 41.8),
    ]]
    chamfer1_side_3 = [part.faces().sort_by_distance(p)[0] for p in [
        (-72.3125, 3.3, 41.8),
    ]]
    chamfer1_edges_4 = [part.edges().sort_by_distance(p)[0] for p in [
        (-67.767766953, 6.6, 47.767766953),
    ]]
    chamfer1_side_4 = [part.faces().sort_by_distance(p)[0] for p in [
        (-67.767766953, 3.3, 47.767766953),
    ]]
    chamfer1_edges_5 = [part.edges().sort_by_distance(p)[0] for p in [
        (-74.392766953, 6.6, 41.067766953),
    ]]
    chamfer1_side_5 = [part.faces().sort_by_distance(p)[0] for p in [
        (-74.392766953, 3.3, 41.067766953),
    ]]
    chamfer1 = BRepFilletAPI_MakeChamfer(part.part.solid().wrapped)
    for e in chamfer1_edges_1:
        chamfer1.Add(CHAMFER1_SIZE, CHAMFER1_SIZE2, e.wrapped, chamfer1_side_1[0].wrapped)  # the first distance lies on this face
    for e in chamfer1_edges_2:
        chamfer1.Add(CHAMFER1_SIZE, CHAMFER1_SIZE2, e.wrapped, chamfer1_side_2[0].wrapped)  # the first distance lies on this face
    for e in chamfer1_edges_3:
        chamfer1.Add(CHAMFER1_SIZE, CHAMFER1_SIZE2, e.wrapped, chamfer1_side_3[0].wrapped)  # the first distance lies on this face
    for e in chamfer1_edges_4:
        chamfer1.Add(CHAMFER1_SIZE, CHAMFER1_SIZE2, e.wrapped, chamfer1_side_4[0].wrapped)  # the first distance lies on this face
    for e in chamfer1_edges_5:
        chamfer1.Add(CHAMFER1_SIZE, CHAMFER1_SIZE2, e.wrapped, chamfer1_side_5[0].wrapped)  # the first distance lies on this face
    add(Compound.cast(chamfer1.Shape()), mode=Mode.REPLACE)


solid = part.part
